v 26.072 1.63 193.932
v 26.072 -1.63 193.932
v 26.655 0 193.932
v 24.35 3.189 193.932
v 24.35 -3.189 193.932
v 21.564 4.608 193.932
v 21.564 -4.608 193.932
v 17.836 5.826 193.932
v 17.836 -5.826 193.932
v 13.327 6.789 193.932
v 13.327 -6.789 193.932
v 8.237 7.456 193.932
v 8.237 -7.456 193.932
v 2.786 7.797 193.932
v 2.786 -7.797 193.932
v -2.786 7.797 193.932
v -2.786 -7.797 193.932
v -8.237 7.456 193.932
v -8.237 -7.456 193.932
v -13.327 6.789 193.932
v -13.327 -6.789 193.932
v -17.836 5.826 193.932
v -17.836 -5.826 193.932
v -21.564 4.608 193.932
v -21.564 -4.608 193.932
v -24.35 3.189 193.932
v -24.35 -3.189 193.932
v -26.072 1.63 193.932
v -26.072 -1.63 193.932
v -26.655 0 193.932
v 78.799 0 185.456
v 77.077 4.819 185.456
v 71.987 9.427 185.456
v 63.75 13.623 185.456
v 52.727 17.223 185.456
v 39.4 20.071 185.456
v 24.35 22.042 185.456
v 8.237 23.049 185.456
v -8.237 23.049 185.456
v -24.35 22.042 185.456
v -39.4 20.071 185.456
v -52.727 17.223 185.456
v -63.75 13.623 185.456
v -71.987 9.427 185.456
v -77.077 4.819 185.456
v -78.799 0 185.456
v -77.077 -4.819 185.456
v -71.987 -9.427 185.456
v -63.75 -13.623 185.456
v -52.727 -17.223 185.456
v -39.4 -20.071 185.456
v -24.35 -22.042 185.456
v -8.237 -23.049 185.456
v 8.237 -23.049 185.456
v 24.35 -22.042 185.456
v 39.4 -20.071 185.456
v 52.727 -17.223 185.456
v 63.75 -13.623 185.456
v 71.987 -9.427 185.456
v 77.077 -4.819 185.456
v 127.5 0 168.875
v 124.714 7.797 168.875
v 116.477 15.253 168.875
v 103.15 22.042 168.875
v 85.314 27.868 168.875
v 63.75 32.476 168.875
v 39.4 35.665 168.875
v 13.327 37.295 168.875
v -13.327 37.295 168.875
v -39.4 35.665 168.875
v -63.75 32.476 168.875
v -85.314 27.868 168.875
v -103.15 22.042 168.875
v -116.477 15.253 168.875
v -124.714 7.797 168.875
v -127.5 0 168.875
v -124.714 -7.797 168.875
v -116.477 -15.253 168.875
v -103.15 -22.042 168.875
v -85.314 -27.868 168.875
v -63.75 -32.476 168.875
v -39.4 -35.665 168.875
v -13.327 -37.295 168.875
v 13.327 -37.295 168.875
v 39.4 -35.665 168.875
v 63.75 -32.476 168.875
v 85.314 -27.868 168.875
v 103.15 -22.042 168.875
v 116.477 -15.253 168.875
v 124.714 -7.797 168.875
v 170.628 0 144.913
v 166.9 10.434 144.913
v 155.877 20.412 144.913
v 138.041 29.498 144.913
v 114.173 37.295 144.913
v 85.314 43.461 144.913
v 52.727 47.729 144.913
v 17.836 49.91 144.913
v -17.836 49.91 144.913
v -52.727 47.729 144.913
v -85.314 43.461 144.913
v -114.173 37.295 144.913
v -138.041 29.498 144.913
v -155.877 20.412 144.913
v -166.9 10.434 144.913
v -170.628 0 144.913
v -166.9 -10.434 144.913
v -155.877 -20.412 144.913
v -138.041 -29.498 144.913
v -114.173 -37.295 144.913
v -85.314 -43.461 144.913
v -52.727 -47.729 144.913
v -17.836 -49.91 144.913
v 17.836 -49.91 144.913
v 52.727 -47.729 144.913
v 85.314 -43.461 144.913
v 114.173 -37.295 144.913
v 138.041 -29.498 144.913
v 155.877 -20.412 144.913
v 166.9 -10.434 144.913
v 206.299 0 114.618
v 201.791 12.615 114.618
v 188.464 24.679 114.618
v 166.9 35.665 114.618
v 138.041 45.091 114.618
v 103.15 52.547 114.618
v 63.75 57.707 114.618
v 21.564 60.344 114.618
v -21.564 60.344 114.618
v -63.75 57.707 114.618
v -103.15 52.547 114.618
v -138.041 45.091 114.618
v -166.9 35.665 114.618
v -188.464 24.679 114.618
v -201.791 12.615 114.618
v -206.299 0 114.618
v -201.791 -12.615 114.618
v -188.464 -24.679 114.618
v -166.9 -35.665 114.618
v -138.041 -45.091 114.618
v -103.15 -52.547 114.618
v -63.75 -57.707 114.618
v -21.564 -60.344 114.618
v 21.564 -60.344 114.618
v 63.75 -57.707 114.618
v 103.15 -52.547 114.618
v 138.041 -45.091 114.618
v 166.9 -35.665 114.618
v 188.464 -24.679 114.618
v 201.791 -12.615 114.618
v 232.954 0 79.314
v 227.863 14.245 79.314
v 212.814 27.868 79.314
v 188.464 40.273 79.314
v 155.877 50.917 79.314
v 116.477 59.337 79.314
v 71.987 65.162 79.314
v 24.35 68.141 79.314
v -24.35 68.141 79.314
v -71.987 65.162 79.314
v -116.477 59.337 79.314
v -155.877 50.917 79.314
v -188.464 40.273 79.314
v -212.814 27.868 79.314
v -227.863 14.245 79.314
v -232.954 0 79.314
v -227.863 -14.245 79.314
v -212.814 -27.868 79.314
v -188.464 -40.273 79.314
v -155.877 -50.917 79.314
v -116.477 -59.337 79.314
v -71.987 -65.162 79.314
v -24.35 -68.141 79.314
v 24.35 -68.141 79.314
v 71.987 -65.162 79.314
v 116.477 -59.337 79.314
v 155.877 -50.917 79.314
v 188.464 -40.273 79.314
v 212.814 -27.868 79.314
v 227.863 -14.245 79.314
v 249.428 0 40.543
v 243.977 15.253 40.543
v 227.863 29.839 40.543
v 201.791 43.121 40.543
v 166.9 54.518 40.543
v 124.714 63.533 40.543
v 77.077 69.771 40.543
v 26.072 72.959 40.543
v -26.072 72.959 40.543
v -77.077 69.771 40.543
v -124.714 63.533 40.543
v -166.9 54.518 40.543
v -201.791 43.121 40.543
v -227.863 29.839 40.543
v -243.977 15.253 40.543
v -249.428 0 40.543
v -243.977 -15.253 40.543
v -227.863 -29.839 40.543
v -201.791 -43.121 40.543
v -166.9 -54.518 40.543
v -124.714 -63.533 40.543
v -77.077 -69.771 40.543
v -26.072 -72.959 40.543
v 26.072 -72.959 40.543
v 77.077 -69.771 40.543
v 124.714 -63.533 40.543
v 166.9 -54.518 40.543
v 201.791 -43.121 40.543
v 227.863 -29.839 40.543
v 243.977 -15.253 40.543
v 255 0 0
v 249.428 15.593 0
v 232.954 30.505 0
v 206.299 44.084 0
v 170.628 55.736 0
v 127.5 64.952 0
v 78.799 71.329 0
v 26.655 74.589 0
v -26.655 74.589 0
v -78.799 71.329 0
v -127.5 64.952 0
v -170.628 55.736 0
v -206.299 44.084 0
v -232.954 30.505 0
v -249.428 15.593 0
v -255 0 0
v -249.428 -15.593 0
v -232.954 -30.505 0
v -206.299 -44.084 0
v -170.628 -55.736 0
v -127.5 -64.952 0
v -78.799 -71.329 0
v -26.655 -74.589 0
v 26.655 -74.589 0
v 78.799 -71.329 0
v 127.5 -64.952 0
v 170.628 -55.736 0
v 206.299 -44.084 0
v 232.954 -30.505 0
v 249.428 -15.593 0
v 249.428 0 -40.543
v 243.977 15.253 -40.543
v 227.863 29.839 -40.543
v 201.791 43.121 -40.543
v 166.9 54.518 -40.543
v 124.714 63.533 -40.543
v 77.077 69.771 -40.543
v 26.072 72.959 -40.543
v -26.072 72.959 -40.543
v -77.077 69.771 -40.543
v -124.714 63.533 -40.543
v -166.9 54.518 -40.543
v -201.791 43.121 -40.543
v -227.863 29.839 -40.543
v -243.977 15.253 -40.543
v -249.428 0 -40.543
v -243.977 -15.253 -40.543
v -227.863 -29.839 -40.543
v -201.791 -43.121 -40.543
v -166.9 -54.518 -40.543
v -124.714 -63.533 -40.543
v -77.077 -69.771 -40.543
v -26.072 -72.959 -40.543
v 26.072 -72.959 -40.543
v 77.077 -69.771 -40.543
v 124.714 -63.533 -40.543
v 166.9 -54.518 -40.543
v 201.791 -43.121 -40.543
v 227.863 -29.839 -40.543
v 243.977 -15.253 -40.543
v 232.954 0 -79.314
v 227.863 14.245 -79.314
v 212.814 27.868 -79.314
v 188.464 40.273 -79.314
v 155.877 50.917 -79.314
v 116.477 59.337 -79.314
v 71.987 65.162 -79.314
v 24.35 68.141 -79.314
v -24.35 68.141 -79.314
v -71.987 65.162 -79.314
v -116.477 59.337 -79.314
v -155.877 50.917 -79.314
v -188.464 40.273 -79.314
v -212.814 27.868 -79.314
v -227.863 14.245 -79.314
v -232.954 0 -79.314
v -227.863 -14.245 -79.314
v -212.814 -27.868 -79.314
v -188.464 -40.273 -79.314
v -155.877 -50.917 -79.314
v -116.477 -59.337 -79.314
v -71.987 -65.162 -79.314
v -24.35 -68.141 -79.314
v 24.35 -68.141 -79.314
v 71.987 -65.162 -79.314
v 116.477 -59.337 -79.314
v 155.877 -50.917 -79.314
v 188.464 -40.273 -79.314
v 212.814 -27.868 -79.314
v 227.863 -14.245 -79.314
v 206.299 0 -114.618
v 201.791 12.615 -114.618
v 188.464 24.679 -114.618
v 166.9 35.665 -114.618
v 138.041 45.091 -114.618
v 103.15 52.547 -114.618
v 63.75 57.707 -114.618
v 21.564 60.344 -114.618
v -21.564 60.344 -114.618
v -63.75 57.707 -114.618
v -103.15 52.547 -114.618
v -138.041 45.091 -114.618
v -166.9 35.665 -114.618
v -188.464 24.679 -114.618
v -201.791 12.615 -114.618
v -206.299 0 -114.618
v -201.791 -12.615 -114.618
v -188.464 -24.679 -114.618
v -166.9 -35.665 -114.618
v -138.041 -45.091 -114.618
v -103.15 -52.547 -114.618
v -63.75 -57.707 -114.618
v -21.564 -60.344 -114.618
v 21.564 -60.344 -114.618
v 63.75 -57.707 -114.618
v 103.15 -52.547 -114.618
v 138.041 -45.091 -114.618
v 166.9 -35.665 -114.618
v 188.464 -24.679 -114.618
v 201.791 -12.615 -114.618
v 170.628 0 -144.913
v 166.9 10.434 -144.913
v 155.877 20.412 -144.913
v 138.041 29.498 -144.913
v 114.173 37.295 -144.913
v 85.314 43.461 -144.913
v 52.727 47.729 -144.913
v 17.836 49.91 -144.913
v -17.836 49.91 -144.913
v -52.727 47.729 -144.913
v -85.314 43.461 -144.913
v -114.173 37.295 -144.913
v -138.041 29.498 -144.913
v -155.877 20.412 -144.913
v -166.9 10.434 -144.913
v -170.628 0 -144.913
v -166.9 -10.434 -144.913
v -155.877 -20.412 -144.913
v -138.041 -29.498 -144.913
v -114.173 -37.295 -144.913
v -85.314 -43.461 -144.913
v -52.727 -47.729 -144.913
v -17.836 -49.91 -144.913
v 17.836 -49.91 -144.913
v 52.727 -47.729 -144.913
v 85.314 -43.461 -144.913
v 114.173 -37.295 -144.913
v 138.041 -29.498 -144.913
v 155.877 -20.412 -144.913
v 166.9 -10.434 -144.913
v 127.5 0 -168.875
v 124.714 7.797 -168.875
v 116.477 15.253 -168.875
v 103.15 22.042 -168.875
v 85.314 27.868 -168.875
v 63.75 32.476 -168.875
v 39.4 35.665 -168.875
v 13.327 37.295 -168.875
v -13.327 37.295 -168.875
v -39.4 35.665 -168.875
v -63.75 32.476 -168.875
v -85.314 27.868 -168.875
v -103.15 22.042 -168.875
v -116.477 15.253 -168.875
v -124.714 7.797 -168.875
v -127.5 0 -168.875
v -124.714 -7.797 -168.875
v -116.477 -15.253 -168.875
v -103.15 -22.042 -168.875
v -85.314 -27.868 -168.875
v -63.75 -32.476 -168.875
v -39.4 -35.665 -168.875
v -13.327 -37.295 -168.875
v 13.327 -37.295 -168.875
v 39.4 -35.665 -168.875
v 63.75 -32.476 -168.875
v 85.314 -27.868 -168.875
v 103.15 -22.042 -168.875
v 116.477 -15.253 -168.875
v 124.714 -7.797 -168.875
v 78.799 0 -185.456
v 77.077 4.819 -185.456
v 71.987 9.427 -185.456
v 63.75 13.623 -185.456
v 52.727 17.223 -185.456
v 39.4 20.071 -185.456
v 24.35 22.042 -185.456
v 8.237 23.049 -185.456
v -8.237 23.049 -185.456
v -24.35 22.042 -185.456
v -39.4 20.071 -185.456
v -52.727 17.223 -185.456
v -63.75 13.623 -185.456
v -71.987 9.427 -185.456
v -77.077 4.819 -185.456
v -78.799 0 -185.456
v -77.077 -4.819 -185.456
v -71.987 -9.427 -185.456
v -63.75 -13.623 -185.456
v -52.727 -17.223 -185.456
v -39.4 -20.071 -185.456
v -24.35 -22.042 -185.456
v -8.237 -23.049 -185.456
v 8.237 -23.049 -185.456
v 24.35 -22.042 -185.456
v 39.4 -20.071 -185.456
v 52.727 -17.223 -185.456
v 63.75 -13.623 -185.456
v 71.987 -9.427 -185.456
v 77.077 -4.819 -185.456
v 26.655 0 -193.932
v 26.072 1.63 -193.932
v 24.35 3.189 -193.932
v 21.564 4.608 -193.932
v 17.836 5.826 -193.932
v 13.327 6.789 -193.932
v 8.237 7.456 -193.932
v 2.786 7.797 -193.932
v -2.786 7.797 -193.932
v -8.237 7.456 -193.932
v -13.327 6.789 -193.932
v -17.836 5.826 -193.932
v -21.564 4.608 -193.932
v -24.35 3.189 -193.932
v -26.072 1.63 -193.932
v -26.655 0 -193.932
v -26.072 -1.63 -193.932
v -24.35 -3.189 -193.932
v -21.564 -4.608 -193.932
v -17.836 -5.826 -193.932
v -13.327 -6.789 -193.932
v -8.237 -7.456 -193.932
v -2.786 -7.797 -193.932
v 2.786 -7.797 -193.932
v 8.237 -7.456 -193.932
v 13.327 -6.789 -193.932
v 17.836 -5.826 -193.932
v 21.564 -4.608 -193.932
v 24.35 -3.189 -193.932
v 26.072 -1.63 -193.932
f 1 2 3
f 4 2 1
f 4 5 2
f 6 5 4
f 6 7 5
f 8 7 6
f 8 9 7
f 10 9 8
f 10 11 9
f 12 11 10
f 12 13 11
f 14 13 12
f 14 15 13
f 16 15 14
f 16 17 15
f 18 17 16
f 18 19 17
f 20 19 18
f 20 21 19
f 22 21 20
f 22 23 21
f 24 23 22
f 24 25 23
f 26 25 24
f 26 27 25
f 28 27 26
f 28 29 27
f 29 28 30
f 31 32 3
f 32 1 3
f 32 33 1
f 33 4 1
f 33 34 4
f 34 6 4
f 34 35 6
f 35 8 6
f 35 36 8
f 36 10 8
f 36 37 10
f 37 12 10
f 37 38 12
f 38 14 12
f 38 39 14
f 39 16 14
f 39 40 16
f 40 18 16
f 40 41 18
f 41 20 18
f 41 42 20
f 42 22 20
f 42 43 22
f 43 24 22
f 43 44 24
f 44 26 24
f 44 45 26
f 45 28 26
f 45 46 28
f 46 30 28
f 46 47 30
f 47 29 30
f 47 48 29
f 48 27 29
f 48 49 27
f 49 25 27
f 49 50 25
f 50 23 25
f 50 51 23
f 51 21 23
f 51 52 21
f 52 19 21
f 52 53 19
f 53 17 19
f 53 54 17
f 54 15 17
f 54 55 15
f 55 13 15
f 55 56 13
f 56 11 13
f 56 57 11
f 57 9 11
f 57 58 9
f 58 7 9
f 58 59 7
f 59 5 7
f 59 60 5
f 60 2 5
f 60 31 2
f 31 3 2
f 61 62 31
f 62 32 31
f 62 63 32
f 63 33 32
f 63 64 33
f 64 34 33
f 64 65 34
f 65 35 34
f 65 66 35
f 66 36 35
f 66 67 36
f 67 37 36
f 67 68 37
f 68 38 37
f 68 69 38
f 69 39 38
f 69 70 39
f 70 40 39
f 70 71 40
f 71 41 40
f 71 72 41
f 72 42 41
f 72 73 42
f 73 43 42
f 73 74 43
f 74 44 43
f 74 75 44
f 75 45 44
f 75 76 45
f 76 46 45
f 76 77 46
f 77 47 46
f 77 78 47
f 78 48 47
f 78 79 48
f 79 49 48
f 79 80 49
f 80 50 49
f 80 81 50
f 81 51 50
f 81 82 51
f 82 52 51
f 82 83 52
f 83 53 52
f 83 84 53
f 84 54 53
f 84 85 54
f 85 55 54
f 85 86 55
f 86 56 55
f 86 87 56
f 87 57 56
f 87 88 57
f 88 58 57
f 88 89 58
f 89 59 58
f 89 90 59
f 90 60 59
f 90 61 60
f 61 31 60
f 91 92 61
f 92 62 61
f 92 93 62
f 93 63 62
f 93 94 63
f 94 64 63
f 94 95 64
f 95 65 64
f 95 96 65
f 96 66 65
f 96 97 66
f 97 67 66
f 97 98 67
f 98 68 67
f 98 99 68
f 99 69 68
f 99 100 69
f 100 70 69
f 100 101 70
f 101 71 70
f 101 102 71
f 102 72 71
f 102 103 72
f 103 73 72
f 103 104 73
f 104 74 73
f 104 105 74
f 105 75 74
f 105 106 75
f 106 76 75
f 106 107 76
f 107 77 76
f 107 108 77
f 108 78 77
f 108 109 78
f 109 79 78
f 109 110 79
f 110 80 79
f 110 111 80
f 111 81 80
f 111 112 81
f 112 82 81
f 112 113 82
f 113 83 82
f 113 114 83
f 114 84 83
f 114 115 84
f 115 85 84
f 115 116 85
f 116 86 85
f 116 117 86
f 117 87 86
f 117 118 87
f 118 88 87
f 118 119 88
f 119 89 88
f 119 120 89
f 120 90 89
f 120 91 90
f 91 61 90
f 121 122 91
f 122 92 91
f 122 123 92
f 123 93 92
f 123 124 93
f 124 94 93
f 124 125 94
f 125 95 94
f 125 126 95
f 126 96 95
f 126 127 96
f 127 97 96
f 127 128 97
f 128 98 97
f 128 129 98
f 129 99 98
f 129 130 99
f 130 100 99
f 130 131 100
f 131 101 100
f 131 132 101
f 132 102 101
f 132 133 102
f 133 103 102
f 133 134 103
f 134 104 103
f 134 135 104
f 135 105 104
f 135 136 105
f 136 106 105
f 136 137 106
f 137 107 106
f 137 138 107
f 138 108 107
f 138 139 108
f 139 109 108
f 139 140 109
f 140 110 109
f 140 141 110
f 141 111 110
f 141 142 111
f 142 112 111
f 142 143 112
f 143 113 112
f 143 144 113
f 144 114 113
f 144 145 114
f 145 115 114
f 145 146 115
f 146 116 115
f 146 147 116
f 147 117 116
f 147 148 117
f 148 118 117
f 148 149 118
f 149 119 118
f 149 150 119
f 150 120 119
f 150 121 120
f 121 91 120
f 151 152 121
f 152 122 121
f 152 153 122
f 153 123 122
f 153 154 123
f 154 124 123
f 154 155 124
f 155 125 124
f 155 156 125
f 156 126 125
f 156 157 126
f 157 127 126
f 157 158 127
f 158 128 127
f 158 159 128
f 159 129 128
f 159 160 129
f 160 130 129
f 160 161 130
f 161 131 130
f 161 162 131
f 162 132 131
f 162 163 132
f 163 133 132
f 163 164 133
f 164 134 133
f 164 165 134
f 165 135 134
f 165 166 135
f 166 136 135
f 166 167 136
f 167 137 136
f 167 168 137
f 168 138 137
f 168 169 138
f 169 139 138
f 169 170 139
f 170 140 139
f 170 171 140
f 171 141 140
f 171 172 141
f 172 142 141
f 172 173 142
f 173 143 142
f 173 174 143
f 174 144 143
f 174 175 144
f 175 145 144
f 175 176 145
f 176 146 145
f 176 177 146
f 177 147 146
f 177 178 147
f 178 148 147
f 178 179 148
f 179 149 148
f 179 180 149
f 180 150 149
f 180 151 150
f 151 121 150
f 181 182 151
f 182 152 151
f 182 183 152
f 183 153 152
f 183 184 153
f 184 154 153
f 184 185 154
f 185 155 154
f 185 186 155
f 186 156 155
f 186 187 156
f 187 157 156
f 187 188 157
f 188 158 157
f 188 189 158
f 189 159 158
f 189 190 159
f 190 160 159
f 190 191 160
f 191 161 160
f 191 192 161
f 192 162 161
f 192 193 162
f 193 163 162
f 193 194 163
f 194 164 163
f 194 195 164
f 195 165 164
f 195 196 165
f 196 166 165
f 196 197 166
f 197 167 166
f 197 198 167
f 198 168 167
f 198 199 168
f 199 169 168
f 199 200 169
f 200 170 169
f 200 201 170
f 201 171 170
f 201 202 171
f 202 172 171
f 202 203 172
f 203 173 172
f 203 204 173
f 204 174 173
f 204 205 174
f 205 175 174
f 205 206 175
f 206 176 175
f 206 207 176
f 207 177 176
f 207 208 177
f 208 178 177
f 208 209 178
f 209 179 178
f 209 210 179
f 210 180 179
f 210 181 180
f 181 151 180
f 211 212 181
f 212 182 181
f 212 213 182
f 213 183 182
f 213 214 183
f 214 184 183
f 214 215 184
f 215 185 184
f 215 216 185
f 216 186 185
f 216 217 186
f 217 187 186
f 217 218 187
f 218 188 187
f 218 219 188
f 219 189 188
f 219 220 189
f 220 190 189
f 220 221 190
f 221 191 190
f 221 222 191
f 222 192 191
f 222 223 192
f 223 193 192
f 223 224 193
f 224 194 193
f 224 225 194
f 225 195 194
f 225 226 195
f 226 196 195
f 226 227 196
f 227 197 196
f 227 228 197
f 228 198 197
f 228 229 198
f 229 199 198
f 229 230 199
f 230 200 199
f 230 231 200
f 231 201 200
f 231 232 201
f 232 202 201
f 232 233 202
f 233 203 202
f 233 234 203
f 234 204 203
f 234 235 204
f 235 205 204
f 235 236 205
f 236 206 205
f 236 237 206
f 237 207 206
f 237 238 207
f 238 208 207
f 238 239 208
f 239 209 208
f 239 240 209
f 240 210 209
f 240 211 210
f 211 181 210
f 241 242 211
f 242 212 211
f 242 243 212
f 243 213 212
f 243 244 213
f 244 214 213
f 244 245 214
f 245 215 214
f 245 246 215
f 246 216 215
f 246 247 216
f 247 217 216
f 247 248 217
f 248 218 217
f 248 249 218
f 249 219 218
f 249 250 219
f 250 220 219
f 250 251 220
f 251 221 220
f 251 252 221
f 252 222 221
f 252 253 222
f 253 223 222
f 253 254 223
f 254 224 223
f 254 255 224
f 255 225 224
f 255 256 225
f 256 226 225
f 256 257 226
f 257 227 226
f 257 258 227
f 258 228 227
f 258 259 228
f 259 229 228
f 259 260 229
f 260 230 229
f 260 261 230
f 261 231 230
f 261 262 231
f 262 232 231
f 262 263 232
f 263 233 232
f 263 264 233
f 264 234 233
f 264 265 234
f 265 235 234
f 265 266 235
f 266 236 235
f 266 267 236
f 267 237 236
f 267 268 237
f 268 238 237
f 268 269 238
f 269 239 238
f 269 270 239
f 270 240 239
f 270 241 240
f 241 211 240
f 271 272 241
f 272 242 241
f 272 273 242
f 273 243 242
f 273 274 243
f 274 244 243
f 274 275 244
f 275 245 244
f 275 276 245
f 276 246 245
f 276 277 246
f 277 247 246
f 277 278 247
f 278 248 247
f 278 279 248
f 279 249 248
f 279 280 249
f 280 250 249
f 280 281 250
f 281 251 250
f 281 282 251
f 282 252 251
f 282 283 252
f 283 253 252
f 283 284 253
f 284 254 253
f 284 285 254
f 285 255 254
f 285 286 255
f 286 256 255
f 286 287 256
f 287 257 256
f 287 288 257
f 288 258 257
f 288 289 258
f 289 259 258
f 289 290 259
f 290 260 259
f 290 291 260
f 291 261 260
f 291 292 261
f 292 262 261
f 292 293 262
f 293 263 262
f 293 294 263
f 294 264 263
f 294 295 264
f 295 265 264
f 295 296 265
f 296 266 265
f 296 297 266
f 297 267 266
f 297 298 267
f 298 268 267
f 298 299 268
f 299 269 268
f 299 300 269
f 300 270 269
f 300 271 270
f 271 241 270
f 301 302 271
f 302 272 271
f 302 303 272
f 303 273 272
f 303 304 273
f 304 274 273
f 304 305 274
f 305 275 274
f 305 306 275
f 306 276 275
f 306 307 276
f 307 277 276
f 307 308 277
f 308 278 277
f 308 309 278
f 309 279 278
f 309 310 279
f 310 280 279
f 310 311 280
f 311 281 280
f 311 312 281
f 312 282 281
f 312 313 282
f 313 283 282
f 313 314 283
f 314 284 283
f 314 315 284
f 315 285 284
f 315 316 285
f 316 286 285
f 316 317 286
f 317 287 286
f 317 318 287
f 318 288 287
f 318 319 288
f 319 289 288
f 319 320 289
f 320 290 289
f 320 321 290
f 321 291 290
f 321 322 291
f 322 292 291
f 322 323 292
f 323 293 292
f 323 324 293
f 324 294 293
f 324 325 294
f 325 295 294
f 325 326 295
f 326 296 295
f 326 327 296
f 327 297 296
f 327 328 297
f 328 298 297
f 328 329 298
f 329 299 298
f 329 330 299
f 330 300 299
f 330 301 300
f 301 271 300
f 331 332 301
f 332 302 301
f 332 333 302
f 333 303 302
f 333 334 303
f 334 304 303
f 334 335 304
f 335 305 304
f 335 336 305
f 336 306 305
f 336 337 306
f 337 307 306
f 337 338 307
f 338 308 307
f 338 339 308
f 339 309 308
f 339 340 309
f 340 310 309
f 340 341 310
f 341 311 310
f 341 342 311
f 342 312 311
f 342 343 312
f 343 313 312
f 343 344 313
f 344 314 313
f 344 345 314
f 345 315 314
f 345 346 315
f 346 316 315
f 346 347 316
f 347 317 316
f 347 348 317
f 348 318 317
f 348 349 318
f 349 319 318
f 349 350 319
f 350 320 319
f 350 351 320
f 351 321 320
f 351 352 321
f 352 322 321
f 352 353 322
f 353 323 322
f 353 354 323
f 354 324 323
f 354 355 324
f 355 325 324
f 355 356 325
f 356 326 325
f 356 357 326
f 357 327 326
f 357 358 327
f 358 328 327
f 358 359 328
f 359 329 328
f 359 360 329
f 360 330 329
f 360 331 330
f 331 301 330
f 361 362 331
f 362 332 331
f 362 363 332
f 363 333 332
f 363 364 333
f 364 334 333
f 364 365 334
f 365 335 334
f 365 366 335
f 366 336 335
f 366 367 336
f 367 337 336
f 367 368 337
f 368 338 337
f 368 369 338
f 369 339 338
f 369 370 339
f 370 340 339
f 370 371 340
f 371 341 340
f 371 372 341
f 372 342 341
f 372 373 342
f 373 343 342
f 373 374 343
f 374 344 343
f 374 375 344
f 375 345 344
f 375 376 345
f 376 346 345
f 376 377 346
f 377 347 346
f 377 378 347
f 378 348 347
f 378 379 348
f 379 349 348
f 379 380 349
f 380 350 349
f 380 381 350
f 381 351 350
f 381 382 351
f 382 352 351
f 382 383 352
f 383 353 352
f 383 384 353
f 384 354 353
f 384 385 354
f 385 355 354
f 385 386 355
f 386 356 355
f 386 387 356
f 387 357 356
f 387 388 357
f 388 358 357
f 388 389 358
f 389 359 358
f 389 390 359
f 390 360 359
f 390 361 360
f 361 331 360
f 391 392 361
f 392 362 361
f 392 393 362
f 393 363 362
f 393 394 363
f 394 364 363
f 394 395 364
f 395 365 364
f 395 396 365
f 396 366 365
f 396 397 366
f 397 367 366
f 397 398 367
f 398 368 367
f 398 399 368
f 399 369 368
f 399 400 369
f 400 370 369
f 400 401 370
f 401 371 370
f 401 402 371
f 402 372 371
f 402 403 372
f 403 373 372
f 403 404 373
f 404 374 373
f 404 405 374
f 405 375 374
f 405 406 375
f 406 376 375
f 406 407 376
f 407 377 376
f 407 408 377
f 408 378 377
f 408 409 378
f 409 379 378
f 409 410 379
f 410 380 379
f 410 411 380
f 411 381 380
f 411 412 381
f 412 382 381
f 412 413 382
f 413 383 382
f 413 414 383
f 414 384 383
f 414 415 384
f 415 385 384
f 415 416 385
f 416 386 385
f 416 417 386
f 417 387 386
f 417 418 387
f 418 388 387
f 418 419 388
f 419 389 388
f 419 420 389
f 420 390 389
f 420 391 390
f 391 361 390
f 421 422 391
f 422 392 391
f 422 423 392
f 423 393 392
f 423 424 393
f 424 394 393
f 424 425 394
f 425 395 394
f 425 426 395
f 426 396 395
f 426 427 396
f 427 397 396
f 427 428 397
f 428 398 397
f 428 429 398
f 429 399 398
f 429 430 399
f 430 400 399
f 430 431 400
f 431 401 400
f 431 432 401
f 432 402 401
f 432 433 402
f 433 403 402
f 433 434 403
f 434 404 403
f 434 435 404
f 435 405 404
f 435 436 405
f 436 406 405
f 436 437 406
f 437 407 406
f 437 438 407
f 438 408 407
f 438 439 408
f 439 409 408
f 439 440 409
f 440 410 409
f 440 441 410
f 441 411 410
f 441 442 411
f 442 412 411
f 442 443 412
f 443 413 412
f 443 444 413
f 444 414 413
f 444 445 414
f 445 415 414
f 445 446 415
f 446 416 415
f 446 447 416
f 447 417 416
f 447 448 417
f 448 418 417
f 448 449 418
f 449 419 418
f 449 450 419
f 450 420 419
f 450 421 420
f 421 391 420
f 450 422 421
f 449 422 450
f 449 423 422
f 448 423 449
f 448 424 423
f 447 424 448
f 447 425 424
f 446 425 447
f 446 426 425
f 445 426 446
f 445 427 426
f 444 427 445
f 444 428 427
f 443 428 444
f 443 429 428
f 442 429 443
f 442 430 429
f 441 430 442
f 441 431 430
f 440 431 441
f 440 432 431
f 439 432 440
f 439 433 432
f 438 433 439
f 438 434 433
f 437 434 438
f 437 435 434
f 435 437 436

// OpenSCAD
// Generated by SolidPython 1.0.1 on 2020-07-29 00:46:52


scale(v = [17, 5, 13]) {
	sphere(r = 15);
}
/***********************************************
*********      SolidPython code:      **********
************************************************
 
# import packages: SolidPython
from solid import *
from solid.utils import *
from itertools import chain, combinations, permutations


class Resize:

    def __init__(self, scad_file):
        self.scad_file = scad_file
        #self.scad_file = import_scad(scad_file)
        # cone/cylinder param:
        self.r1 = 0
        self.r2 = 0
        self.h = 0
        # rectangular prism param:
        self.w = 0
        self.l = 0
        # ellipse param:
        self.r = 0

    # import OpenScad code (file name corresponds to shape)


    # classify shape + parameters
    def assign(self, param1, param2, param3):
        if self.scad_file == 'cone.scad':
            self.r1 = param1
            self.r2 = param2
            self.h = param3
        elif self.scad_file == 'cylinder.scad':
            self.r1 = param1
            self.r2 = param2
            self.h = param3
        elif self.scad_file == 'rectangularPrism.scad':
            self.h = param1
            self.l = param2
            self.w = param3
        else:
            self.r = param1
            self.h = param2

    # resize parameters
    def iterate(self):
        x = range(3, 20, 2)
        i = 1
        if self.scad_file == 'cone.scad':
            tempList = list(permutations(x, 2))
            for temp in tempList:
                param1 = temp[0]
                param2 = temp[1]
                filepath = 'produced_scad_files/' + 'cone' + str(param1) + '_' + str(param2) + '_' + '.scad'
                scad_render_to_file(cylinder(h=param1, r1=param2, r2=0), filepath)

        elif self.scad_file == 'cylinder.scad':
            tempList = list(permutations(x, 3))
            for temp in tempList:
                param1 = temp[0]
                param2 = temp[1]
                filepath = 'produced_scad_files/' + 'cylinder' + str(param1) + '_' + str(param2) + '_' + '.scad'
                scad_render_to_file(cylinder(h=param1, r1=param2, r2=param2), filepath)

        elif self.scad_file == 'rectangularPrism.scad':
            tempList = list(permutations(x, 3))
            for temp in tempList:
                param1 = temp[0]
                param2 = temp[1]
                param3 = temp[2]
                filepath = 'produced_scad_files/' + 'rectangularPrism' + str(param1) + '_' + str(param2) + '_' + str(
                    param3) + '.scad'
                scad_render_to_file(cube(size=(param1, param2, param3)), filepath)

        elif self.scad_file == 'ellipse.scad':
            tempList = list(permutations(x, 4))
            for temp in tempList:
                param1 = temp[0]
                param2 = temp[1]
                param3 = temp[2]
                param4 = temp[3]
                filepath = 'produced_scad_files/' + 'ellipse' + str(param1) + '_' + str(param2) + '_' + str(param3) + '_' + str(param4) + '.scad'
                scad_render_to_file(scale([param1, param2, param3])(sphere(r=param4)), filepath)

    def render_to_scadfile(self):
        scad_render_to_file(scad, 'example.scad') 
 
************************************************/
